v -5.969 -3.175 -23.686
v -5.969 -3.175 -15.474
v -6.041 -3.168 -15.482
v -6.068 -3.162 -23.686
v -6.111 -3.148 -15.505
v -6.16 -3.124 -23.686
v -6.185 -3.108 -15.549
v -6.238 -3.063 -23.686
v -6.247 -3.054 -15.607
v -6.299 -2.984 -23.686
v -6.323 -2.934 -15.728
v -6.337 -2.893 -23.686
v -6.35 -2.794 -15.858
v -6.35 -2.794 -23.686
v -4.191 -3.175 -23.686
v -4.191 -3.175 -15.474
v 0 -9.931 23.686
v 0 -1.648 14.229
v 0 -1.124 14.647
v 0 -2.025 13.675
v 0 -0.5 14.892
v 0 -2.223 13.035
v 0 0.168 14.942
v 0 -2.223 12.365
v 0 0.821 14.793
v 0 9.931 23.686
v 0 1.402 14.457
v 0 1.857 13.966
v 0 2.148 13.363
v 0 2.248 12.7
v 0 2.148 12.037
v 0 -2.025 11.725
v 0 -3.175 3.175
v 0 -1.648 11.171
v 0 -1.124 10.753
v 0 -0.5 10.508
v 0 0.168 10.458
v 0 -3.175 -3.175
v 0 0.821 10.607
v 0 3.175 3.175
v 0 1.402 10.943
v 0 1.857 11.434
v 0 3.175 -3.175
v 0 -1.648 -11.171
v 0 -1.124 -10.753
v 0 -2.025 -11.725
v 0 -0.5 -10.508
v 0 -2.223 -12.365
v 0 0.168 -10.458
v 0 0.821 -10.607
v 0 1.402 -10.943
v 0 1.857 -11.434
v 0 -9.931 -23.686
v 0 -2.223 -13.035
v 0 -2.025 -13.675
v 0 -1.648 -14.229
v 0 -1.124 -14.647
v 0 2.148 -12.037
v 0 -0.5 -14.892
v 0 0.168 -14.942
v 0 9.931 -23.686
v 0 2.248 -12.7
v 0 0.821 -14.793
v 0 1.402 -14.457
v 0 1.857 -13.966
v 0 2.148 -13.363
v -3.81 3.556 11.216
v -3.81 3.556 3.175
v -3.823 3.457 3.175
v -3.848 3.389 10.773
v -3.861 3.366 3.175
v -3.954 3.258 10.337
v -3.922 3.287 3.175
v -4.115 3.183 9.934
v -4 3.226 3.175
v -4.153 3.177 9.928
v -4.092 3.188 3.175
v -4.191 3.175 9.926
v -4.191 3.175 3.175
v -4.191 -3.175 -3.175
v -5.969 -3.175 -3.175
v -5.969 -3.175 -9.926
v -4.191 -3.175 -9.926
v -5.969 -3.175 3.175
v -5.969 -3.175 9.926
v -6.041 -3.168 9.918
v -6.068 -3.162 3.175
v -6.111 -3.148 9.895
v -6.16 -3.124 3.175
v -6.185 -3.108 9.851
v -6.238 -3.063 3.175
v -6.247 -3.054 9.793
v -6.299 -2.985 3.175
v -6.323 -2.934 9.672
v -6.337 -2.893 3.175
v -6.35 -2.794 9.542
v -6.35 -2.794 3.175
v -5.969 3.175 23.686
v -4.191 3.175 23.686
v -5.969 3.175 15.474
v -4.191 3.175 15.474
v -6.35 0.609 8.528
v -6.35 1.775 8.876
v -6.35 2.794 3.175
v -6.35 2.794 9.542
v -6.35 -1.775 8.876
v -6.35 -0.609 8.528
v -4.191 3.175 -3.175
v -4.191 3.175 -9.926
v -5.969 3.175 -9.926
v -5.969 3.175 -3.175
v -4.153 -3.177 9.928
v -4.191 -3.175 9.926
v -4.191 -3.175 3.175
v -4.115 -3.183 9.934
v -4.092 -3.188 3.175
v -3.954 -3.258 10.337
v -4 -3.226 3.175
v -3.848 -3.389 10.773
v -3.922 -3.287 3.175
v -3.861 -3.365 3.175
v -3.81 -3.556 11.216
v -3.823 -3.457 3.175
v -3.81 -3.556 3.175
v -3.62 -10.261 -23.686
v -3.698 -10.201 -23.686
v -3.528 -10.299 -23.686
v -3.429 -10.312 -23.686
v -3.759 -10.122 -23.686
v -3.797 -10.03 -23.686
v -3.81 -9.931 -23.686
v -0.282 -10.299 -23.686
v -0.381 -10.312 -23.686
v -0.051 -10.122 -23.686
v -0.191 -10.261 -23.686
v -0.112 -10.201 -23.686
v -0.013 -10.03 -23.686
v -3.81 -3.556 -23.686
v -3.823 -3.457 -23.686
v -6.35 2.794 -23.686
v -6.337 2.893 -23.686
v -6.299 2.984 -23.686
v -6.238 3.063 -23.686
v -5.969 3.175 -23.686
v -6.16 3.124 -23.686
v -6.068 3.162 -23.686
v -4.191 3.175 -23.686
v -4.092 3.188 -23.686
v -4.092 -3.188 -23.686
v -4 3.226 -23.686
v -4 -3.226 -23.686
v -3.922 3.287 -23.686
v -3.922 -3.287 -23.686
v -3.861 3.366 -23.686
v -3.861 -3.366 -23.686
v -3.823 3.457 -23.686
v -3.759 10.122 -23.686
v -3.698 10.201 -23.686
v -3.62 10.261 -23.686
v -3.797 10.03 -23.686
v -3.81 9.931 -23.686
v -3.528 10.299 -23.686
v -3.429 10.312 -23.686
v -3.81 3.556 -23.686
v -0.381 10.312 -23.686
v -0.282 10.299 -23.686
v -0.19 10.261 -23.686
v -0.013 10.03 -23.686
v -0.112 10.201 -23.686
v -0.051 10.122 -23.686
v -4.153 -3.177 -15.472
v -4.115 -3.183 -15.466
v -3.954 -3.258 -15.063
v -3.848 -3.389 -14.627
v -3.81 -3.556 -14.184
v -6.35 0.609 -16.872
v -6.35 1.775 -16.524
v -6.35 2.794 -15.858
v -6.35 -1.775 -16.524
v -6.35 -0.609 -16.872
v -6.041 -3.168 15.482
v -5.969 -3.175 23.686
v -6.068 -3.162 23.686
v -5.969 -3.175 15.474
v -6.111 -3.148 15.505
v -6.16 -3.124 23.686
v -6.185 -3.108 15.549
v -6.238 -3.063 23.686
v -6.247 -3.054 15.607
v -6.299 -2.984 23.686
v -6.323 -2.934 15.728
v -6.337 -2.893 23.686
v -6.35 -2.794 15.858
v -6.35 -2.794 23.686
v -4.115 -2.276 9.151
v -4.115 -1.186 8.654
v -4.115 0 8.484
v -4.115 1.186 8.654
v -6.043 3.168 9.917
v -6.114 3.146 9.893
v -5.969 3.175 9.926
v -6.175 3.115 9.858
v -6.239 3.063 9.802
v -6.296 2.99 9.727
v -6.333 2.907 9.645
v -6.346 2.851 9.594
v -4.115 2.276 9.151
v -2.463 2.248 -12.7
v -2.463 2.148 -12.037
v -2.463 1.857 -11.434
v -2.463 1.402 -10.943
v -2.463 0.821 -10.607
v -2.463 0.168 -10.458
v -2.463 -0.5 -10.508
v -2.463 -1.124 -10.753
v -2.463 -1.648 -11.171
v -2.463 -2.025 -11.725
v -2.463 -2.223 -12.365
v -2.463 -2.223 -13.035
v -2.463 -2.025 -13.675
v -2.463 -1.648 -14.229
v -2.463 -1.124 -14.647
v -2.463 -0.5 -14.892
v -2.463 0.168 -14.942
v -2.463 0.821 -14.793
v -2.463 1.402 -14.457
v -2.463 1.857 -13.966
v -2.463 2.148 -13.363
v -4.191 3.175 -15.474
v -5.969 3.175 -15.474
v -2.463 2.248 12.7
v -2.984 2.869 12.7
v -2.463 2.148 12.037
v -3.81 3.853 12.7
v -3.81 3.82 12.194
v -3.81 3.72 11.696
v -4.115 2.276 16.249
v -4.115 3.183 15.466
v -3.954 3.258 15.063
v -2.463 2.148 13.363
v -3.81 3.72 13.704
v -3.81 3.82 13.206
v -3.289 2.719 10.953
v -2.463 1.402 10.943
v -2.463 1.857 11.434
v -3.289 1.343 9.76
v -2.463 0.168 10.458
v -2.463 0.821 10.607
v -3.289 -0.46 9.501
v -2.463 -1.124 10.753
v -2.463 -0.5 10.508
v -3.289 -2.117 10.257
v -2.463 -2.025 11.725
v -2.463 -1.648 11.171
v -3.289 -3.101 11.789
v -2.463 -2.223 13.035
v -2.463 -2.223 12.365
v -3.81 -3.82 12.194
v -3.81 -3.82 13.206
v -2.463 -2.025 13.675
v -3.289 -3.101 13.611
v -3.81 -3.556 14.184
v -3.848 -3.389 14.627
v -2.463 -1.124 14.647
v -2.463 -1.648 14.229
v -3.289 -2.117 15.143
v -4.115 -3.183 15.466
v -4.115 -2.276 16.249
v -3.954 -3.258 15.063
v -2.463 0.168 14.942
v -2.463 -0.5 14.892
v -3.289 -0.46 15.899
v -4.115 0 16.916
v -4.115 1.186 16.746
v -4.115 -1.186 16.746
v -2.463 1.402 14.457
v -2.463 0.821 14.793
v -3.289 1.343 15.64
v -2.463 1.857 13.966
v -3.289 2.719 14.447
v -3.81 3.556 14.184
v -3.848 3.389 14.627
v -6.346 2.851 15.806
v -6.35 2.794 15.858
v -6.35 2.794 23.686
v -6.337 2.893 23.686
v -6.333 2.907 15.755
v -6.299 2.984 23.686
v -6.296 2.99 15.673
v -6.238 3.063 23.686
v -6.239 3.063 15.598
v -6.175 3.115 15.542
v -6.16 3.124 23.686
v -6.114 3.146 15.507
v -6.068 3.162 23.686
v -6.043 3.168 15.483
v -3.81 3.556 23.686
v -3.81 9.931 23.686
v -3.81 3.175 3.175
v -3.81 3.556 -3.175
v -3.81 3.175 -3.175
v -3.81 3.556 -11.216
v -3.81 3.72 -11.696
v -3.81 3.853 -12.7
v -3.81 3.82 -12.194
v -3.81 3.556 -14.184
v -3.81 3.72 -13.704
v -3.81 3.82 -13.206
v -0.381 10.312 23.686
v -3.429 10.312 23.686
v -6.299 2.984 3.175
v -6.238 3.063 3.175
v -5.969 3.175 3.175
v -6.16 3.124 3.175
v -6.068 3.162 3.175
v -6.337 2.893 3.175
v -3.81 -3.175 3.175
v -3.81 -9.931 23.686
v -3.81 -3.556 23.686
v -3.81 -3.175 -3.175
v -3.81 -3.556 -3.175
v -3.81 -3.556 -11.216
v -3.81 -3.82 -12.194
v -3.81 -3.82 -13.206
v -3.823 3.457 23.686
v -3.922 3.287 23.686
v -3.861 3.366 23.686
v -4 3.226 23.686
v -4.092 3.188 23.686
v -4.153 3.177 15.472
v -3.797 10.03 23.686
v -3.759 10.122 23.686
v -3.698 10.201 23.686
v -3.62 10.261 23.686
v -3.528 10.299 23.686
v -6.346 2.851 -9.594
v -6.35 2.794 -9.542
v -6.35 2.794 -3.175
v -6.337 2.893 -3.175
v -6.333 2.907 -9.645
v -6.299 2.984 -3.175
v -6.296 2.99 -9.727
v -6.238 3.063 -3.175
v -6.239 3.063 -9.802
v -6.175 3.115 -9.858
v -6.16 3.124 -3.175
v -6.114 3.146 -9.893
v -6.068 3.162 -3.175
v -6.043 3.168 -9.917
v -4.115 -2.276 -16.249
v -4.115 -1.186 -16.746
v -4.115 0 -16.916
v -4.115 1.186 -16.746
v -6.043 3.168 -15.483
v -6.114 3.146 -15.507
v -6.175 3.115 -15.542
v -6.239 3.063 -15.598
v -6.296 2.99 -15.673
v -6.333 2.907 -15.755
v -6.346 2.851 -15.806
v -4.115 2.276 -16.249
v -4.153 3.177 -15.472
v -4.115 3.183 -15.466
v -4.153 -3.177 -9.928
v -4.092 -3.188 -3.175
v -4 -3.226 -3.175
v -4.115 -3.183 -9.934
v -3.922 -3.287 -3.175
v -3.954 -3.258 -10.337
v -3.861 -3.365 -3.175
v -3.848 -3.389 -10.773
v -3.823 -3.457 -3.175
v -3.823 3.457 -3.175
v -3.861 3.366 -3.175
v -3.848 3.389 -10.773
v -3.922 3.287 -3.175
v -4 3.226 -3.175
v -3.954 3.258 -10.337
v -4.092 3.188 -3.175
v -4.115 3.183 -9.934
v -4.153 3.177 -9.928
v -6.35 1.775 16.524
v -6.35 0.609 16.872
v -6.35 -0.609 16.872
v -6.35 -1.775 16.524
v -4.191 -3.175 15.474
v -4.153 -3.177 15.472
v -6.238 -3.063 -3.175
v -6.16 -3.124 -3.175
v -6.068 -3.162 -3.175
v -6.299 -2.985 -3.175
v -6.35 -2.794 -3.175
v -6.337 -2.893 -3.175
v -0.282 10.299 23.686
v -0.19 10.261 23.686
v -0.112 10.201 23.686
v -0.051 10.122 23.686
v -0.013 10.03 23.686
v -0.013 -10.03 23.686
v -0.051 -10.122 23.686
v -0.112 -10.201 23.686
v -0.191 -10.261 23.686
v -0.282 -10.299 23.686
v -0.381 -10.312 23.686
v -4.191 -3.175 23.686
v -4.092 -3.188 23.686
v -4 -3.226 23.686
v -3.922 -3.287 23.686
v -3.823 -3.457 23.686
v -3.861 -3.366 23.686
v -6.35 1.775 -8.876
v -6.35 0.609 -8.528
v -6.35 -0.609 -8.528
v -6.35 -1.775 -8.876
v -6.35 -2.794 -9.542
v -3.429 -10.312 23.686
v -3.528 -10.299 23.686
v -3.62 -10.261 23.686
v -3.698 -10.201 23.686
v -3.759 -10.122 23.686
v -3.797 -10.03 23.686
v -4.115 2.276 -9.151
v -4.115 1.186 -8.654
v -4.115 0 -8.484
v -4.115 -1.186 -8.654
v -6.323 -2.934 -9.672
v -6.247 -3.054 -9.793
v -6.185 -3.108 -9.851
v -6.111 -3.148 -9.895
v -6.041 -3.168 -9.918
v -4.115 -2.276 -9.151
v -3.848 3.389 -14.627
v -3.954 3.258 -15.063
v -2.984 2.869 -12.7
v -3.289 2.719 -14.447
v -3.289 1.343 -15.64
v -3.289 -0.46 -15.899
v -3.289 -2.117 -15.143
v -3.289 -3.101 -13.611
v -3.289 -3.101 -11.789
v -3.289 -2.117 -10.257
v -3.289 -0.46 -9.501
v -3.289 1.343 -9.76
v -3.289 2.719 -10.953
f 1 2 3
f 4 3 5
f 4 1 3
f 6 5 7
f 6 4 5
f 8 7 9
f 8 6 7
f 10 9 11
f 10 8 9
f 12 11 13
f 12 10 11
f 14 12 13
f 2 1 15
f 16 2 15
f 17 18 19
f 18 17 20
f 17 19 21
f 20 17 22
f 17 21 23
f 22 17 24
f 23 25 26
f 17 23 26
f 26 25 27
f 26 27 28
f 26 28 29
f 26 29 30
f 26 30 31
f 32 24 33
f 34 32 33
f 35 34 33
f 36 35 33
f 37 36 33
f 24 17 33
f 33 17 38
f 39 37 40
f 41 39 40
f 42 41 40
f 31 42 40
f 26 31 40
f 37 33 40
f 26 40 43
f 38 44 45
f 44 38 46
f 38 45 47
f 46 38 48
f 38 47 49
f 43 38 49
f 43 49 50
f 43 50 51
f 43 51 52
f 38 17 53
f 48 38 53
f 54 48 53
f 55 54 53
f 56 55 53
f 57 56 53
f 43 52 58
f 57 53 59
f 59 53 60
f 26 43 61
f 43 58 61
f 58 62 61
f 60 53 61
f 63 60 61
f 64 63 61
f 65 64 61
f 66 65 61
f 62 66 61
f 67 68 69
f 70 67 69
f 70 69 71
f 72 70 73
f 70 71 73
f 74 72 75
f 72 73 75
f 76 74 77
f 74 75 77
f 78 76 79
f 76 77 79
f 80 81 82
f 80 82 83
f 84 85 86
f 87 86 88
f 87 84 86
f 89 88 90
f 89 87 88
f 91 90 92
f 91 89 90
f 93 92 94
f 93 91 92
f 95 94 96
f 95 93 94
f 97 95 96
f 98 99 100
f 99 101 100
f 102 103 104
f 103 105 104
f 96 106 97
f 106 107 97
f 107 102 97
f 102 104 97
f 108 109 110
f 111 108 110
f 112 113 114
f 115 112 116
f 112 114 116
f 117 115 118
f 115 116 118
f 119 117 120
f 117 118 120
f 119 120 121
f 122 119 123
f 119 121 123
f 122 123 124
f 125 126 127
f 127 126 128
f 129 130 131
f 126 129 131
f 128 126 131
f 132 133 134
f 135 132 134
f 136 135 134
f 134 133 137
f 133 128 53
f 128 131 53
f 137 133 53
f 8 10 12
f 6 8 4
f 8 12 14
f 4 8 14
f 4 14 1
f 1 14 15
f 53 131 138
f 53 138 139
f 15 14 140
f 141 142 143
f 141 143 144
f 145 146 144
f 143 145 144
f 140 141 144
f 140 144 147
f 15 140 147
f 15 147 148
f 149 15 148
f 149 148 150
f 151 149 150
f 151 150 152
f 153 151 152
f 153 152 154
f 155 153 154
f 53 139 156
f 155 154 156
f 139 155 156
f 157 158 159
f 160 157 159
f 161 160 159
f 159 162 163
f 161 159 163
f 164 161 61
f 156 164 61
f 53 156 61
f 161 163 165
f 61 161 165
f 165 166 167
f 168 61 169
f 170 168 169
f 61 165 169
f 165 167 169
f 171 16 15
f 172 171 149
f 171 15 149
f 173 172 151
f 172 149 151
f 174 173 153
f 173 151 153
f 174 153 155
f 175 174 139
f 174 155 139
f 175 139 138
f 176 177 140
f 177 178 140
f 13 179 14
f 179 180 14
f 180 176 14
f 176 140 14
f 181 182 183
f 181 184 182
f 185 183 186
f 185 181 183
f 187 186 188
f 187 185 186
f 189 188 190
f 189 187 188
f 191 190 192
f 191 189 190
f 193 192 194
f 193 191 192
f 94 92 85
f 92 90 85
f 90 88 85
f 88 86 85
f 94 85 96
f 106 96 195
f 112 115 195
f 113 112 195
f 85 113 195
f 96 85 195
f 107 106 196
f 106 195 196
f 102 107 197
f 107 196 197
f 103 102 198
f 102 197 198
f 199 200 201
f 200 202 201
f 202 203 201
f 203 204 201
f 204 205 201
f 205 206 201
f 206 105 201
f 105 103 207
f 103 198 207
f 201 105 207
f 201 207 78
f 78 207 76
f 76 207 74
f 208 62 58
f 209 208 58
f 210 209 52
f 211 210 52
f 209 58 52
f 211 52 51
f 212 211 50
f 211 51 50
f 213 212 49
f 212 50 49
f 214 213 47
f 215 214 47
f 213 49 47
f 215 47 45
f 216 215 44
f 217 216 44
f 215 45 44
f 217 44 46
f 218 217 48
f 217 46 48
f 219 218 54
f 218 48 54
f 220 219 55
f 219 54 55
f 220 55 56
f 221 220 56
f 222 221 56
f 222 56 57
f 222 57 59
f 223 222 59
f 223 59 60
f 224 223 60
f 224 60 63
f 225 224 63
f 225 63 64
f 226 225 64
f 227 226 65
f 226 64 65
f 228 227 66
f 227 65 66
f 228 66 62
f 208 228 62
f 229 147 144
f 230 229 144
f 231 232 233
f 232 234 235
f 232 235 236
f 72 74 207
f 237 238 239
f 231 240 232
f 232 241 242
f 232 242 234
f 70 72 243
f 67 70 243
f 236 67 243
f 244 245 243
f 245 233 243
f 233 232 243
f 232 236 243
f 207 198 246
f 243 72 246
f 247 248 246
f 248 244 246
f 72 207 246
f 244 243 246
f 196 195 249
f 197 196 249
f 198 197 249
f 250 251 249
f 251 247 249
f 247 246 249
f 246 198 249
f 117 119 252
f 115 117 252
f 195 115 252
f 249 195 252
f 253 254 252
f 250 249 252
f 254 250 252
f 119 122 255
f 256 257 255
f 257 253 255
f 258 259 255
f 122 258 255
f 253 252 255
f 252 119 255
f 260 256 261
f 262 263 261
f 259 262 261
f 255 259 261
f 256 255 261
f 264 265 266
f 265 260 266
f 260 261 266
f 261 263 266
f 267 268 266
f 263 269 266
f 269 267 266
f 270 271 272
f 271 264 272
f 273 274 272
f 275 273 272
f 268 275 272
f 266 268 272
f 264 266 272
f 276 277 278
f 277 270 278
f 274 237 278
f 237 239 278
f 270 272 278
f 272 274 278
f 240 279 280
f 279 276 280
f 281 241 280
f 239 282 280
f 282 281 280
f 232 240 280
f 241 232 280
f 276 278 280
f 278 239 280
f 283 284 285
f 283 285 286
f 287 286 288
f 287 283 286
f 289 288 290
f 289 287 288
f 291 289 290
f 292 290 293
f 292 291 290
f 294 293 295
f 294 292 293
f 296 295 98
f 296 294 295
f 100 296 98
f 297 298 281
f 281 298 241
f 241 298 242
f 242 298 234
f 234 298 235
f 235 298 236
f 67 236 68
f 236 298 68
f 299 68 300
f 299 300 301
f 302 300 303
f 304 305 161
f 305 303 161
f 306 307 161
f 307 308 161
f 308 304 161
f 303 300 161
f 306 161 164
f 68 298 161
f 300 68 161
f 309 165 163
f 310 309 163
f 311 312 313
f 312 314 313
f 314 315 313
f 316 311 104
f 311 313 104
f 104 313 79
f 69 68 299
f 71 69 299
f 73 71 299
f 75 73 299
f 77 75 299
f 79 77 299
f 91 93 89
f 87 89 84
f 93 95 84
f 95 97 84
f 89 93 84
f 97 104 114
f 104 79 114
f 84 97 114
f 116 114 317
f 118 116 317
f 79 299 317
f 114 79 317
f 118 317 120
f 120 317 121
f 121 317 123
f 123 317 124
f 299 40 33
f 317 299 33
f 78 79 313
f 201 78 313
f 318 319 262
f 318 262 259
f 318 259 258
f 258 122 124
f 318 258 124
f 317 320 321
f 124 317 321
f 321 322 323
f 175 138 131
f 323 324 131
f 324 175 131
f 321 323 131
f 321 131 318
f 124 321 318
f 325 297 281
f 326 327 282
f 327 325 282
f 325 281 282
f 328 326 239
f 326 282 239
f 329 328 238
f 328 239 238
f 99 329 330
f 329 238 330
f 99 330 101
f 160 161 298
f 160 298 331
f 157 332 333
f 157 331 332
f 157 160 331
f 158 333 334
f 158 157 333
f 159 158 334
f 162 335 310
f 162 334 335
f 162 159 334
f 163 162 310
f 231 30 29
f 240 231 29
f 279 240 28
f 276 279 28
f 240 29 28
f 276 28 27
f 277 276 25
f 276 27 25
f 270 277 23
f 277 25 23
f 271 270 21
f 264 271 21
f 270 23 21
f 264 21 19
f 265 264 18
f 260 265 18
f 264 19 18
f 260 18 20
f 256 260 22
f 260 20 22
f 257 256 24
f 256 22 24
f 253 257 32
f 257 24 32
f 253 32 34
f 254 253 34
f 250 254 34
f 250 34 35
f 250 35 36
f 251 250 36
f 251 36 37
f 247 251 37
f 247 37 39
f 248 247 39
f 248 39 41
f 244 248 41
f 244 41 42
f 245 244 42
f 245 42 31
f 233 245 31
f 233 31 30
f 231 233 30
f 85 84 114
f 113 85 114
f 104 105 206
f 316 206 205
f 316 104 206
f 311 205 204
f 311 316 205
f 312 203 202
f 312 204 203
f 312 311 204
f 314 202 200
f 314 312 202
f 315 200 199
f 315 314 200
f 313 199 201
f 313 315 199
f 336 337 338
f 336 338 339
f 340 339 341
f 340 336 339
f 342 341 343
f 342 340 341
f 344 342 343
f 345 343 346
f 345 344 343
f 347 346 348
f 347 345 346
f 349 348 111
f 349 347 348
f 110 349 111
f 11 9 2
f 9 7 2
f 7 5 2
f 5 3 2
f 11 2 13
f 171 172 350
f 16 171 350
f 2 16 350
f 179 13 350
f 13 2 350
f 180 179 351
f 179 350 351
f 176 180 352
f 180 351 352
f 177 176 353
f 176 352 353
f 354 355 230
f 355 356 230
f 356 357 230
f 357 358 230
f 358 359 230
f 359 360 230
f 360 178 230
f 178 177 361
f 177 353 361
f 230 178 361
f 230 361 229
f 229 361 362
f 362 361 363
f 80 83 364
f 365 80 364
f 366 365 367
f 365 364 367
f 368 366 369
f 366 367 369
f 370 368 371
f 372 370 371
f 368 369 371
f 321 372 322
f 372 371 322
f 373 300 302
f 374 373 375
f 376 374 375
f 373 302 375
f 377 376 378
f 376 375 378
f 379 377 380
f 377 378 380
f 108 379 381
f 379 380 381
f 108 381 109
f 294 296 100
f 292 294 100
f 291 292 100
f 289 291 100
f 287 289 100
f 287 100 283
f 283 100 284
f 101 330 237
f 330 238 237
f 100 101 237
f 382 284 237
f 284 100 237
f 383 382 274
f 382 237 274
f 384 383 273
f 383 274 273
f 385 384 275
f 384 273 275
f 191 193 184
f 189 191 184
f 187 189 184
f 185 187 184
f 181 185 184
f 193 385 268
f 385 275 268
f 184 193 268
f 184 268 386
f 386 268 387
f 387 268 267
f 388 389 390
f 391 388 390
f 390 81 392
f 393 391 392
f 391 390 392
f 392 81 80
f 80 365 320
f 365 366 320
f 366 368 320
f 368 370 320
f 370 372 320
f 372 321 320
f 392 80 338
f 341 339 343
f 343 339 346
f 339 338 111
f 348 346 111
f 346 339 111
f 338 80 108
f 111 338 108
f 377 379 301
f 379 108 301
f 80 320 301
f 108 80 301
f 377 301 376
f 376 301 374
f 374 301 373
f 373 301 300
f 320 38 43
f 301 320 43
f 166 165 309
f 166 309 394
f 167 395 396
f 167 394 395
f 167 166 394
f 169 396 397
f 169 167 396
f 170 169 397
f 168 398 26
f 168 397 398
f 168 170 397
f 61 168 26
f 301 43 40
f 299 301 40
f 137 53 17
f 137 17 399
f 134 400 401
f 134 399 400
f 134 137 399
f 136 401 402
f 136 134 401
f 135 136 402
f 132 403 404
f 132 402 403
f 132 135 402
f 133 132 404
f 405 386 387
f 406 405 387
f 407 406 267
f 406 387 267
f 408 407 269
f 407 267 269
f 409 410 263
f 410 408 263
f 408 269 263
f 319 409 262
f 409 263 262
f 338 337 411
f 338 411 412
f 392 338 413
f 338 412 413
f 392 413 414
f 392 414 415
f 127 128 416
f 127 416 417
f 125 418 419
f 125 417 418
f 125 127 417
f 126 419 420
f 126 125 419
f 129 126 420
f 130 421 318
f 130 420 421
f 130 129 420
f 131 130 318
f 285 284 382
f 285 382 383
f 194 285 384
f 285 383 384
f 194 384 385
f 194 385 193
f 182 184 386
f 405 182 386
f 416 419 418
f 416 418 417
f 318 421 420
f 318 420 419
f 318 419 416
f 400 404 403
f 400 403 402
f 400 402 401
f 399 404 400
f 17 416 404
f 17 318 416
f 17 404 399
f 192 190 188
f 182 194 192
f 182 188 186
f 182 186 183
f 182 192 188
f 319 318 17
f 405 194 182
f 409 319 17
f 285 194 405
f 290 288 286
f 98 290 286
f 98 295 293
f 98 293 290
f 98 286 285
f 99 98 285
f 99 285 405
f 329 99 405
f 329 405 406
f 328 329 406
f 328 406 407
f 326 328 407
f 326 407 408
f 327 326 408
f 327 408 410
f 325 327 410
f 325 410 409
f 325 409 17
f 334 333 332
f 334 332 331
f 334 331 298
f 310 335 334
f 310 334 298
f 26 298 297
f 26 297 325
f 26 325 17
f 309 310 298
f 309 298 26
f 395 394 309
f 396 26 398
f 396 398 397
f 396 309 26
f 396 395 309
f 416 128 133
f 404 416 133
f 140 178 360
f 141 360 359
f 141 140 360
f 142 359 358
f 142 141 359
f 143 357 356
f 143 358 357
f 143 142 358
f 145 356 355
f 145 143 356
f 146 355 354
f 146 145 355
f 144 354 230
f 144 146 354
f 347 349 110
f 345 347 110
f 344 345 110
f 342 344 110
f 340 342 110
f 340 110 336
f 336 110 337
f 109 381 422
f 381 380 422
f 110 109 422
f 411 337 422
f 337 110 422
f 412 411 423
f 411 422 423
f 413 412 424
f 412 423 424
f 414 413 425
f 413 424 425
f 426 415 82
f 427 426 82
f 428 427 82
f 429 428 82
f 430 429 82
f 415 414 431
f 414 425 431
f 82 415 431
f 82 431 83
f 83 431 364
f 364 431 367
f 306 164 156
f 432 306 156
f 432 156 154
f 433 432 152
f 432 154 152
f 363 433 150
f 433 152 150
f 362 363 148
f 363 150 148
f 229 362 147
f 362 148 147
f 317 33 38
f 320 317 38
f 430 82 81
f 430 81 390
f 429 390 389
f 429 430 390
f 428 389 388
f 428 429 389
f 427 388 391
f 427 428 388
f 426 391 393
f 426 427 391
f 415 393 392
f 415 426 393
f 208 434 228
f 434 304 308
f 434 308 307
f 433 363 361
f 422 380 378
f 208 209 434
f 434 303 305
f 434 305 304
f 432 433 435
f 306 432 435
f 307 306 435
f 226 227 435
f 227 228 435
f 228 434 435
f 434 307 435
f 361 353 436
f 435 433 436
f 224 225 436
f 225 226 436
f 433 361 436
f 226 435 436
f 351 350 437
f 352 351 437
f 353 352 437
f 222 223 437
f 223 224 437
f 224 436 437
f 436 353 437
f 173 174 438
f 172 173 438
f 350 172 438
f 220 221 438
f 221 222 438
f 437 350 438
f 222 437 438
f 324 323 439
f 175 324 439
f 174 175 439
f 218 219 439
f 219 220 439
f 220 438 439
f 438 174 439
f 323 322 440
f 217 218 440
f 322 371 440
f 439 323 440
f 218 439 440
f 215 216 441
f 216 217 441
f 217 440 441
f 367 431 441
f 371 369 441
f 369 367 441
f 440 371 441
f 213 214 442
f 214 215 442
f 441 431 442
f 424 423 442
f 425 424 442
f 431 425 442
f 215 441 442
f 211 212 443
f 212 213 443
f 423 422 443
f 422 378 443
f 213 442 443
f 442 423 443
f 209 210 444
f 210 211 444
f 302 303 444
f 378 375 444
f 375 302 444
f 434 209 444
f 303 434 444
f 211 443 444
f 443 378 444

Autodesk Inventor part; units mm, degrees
sketch "Sketch_1" plane through (0, 0, 0) normal (0, 0, 1) x (1, 0, 0)
  line L0 (-6.35, 2.794) -> (-6.35, -2.794)
  arc A0 (-6.35, -2.794) -> (-5.969, -3.175) centre (-5.969, -2.794) ccw
  line L1 (-5.969, -3.175) -> (-4.191, -3.175)
  arc A1 (-3.81, -3.556) -> (-4.191, -3.175) centre (-4.191, -3.556) ccw
  line L2 (-3.81, -3.556) -> (-3.81, -9.9314)
  arc A2 (-3.81, -9.9314) -> (-3.429, -10.3124) centre (-3.429, -9.9314) ccw
  line L3 (-3.429, -10.3124) -> (-0.381, -10.3124)
  arc A3 (-0.381, -10.3124) -> (0, -9.9314) centre (-0.381, -9.9314) ccw
  line L4 (0, -9.9314) -> (0, 9.9314)
  arc A4 (0, 9.9314) -> (-0.381, 10.3124) centre (-0.381, 9.9314) ccw
  line L5 (-0.381, 10.3124) -> (-3.429, 10.3124)
  arc A5 (-3.429, 10.3124) -> (-3.81, 9.9314) centre (-3.429, 9.9314) ccw
  line L6 (-3.81, 9.9314) -> (-3.81, 3.556)
  arc A6 (-4.191, 3.175) -> (-3.81, 3.556) centre (-4.191, 3.556) ccw
  line L7 (-4.191, 3.175) -> (-5.969, 3.175)
  arc A7 (-5.969, 3.175) -> (-6.35, 2.794) centre (-5.969, 2.794) ccw
extrude "Extrusion1" add sketch "Sketch_1" along normal mid plane 47.371
sketch "Sketch_2" plane through (0, 0, 12.7) normal (0, 0, 1) x (1, 0, 0)
  line L0 (0, 0) -> (-6.35, 0)
  line L1 (-6.35, 0) -> (-6.35, 4.2164)
  line L2 (-6.35, 4.2164) -> (-4.1148, 4.2164)
  line L3 (-4.1148, 4.2164) -> (-2.463, 2.2479)
  line L4 (-2.463, 2.2479) -> (0, 2.2479)
  line L5 (0, 2.2479) -> (0, 0)
  line L6 (0, 0) -> (-6.35, 0)
revolve "Revolution1" cut sketch "Sketch_2" angle 360 about axis through (0, 0, 12.7) along (1, 0, 0)
sketch "Sketch_3" plane through (0, 0, -12.7) normal (0, 0, 1) x (1, 0, 0)
  line L0 (0, 0) -> (-6.35, 0)
  line L1 (-6.35, 0) -> (-6.35, 4.2164)
  line L2 (-6.35, 4.2164) -> (-4.1148, 4.2164)
  line L3 (-4.1148, 4.2164) -> (-2.463, 2.2479)
  line L4 (-2.463, 2.2479) -> (0, 2.2479)
  line L5 (0, 2.2479) -> (0, 0)
  line L6 (0, 0) -> (-6.35, 0)
revolve "Revolution2" cut sketch "Sketch_3" angle 360 about axis through (0, 0, -12.7) along (1, 0, 0)
sketch "Sketch_4" plane through (0, 0, 0) normal (1, 0, 0) x (0, 1, 0)
  line L0 (-3.175, 3.175) -> (-3.175, -3.175)
  line L1 (-3.175, -3.175) -> (3.175, -3.175)
  line L2 (3.175, -3.175) -> (3.175, 3.175)
  line L3 (3.175, 3.175) -> (-3.175, 3.175)
extrude "Extrusion2" cut sketch "Sketch_4" against normal blind 6.35
sketch "Sketch_5" plane through (0, 0, 0) normal (0, 0, 1) x (1, 0, 0)
  line L0 (-10.16, 6.35) -> (-10.16, -6.35)
  line L1 (-10.16, -6.35) -> (-3.81, -6.35)
  line L2 (-3.81, -6.35) -> (-3.81, 6.35)
  line L3 (-3.81, 6.35) -> (-10.16, 6.35)
extrude "Extrusion3" cut sketch "Sketch_5" along normal mid plane 6.35
ref_plane "pad_XY" through (0, 0, -12.7) normal (1, 0, 0) x (0, 0, -1)
ref_plane "pad_YZ" through (0, 0, -12.7) normal (0, 0, -1) x (0, 1, 0)
ref_plane "pad_ZX" through (0, 0, -12.7) normal (0, 1, 0) x (1, 0, 0)
ref_plane "s1_XY" through (-2.463, 0, 12.7) normal (1, 0, 0) x (0, 0, -1)
ref_plane "s1_YZ" through (-2.463, 0, 12.7) normal (0, 0, -1) x (0, 1, 0)
ref_plane "s1_ZX" through (-2.463, 0, 12.7) normal (0, 1, 0) x (1, 0, 0)
ref_plane "s2_XY" through (-2.463, 0, -12.7) normal (1, 0, 0) x (0, 0, -1)
ref_plane "s2_YZ" through (-2.463, 0, -12.7) normal (0, 0, -1) x (0, 1, 0)
ref_plane "s2_ZX" through (-2.463, 0, -12.7) normal (0, 1, 0) x (1, 0, 0)
properties part number "6705_p"
